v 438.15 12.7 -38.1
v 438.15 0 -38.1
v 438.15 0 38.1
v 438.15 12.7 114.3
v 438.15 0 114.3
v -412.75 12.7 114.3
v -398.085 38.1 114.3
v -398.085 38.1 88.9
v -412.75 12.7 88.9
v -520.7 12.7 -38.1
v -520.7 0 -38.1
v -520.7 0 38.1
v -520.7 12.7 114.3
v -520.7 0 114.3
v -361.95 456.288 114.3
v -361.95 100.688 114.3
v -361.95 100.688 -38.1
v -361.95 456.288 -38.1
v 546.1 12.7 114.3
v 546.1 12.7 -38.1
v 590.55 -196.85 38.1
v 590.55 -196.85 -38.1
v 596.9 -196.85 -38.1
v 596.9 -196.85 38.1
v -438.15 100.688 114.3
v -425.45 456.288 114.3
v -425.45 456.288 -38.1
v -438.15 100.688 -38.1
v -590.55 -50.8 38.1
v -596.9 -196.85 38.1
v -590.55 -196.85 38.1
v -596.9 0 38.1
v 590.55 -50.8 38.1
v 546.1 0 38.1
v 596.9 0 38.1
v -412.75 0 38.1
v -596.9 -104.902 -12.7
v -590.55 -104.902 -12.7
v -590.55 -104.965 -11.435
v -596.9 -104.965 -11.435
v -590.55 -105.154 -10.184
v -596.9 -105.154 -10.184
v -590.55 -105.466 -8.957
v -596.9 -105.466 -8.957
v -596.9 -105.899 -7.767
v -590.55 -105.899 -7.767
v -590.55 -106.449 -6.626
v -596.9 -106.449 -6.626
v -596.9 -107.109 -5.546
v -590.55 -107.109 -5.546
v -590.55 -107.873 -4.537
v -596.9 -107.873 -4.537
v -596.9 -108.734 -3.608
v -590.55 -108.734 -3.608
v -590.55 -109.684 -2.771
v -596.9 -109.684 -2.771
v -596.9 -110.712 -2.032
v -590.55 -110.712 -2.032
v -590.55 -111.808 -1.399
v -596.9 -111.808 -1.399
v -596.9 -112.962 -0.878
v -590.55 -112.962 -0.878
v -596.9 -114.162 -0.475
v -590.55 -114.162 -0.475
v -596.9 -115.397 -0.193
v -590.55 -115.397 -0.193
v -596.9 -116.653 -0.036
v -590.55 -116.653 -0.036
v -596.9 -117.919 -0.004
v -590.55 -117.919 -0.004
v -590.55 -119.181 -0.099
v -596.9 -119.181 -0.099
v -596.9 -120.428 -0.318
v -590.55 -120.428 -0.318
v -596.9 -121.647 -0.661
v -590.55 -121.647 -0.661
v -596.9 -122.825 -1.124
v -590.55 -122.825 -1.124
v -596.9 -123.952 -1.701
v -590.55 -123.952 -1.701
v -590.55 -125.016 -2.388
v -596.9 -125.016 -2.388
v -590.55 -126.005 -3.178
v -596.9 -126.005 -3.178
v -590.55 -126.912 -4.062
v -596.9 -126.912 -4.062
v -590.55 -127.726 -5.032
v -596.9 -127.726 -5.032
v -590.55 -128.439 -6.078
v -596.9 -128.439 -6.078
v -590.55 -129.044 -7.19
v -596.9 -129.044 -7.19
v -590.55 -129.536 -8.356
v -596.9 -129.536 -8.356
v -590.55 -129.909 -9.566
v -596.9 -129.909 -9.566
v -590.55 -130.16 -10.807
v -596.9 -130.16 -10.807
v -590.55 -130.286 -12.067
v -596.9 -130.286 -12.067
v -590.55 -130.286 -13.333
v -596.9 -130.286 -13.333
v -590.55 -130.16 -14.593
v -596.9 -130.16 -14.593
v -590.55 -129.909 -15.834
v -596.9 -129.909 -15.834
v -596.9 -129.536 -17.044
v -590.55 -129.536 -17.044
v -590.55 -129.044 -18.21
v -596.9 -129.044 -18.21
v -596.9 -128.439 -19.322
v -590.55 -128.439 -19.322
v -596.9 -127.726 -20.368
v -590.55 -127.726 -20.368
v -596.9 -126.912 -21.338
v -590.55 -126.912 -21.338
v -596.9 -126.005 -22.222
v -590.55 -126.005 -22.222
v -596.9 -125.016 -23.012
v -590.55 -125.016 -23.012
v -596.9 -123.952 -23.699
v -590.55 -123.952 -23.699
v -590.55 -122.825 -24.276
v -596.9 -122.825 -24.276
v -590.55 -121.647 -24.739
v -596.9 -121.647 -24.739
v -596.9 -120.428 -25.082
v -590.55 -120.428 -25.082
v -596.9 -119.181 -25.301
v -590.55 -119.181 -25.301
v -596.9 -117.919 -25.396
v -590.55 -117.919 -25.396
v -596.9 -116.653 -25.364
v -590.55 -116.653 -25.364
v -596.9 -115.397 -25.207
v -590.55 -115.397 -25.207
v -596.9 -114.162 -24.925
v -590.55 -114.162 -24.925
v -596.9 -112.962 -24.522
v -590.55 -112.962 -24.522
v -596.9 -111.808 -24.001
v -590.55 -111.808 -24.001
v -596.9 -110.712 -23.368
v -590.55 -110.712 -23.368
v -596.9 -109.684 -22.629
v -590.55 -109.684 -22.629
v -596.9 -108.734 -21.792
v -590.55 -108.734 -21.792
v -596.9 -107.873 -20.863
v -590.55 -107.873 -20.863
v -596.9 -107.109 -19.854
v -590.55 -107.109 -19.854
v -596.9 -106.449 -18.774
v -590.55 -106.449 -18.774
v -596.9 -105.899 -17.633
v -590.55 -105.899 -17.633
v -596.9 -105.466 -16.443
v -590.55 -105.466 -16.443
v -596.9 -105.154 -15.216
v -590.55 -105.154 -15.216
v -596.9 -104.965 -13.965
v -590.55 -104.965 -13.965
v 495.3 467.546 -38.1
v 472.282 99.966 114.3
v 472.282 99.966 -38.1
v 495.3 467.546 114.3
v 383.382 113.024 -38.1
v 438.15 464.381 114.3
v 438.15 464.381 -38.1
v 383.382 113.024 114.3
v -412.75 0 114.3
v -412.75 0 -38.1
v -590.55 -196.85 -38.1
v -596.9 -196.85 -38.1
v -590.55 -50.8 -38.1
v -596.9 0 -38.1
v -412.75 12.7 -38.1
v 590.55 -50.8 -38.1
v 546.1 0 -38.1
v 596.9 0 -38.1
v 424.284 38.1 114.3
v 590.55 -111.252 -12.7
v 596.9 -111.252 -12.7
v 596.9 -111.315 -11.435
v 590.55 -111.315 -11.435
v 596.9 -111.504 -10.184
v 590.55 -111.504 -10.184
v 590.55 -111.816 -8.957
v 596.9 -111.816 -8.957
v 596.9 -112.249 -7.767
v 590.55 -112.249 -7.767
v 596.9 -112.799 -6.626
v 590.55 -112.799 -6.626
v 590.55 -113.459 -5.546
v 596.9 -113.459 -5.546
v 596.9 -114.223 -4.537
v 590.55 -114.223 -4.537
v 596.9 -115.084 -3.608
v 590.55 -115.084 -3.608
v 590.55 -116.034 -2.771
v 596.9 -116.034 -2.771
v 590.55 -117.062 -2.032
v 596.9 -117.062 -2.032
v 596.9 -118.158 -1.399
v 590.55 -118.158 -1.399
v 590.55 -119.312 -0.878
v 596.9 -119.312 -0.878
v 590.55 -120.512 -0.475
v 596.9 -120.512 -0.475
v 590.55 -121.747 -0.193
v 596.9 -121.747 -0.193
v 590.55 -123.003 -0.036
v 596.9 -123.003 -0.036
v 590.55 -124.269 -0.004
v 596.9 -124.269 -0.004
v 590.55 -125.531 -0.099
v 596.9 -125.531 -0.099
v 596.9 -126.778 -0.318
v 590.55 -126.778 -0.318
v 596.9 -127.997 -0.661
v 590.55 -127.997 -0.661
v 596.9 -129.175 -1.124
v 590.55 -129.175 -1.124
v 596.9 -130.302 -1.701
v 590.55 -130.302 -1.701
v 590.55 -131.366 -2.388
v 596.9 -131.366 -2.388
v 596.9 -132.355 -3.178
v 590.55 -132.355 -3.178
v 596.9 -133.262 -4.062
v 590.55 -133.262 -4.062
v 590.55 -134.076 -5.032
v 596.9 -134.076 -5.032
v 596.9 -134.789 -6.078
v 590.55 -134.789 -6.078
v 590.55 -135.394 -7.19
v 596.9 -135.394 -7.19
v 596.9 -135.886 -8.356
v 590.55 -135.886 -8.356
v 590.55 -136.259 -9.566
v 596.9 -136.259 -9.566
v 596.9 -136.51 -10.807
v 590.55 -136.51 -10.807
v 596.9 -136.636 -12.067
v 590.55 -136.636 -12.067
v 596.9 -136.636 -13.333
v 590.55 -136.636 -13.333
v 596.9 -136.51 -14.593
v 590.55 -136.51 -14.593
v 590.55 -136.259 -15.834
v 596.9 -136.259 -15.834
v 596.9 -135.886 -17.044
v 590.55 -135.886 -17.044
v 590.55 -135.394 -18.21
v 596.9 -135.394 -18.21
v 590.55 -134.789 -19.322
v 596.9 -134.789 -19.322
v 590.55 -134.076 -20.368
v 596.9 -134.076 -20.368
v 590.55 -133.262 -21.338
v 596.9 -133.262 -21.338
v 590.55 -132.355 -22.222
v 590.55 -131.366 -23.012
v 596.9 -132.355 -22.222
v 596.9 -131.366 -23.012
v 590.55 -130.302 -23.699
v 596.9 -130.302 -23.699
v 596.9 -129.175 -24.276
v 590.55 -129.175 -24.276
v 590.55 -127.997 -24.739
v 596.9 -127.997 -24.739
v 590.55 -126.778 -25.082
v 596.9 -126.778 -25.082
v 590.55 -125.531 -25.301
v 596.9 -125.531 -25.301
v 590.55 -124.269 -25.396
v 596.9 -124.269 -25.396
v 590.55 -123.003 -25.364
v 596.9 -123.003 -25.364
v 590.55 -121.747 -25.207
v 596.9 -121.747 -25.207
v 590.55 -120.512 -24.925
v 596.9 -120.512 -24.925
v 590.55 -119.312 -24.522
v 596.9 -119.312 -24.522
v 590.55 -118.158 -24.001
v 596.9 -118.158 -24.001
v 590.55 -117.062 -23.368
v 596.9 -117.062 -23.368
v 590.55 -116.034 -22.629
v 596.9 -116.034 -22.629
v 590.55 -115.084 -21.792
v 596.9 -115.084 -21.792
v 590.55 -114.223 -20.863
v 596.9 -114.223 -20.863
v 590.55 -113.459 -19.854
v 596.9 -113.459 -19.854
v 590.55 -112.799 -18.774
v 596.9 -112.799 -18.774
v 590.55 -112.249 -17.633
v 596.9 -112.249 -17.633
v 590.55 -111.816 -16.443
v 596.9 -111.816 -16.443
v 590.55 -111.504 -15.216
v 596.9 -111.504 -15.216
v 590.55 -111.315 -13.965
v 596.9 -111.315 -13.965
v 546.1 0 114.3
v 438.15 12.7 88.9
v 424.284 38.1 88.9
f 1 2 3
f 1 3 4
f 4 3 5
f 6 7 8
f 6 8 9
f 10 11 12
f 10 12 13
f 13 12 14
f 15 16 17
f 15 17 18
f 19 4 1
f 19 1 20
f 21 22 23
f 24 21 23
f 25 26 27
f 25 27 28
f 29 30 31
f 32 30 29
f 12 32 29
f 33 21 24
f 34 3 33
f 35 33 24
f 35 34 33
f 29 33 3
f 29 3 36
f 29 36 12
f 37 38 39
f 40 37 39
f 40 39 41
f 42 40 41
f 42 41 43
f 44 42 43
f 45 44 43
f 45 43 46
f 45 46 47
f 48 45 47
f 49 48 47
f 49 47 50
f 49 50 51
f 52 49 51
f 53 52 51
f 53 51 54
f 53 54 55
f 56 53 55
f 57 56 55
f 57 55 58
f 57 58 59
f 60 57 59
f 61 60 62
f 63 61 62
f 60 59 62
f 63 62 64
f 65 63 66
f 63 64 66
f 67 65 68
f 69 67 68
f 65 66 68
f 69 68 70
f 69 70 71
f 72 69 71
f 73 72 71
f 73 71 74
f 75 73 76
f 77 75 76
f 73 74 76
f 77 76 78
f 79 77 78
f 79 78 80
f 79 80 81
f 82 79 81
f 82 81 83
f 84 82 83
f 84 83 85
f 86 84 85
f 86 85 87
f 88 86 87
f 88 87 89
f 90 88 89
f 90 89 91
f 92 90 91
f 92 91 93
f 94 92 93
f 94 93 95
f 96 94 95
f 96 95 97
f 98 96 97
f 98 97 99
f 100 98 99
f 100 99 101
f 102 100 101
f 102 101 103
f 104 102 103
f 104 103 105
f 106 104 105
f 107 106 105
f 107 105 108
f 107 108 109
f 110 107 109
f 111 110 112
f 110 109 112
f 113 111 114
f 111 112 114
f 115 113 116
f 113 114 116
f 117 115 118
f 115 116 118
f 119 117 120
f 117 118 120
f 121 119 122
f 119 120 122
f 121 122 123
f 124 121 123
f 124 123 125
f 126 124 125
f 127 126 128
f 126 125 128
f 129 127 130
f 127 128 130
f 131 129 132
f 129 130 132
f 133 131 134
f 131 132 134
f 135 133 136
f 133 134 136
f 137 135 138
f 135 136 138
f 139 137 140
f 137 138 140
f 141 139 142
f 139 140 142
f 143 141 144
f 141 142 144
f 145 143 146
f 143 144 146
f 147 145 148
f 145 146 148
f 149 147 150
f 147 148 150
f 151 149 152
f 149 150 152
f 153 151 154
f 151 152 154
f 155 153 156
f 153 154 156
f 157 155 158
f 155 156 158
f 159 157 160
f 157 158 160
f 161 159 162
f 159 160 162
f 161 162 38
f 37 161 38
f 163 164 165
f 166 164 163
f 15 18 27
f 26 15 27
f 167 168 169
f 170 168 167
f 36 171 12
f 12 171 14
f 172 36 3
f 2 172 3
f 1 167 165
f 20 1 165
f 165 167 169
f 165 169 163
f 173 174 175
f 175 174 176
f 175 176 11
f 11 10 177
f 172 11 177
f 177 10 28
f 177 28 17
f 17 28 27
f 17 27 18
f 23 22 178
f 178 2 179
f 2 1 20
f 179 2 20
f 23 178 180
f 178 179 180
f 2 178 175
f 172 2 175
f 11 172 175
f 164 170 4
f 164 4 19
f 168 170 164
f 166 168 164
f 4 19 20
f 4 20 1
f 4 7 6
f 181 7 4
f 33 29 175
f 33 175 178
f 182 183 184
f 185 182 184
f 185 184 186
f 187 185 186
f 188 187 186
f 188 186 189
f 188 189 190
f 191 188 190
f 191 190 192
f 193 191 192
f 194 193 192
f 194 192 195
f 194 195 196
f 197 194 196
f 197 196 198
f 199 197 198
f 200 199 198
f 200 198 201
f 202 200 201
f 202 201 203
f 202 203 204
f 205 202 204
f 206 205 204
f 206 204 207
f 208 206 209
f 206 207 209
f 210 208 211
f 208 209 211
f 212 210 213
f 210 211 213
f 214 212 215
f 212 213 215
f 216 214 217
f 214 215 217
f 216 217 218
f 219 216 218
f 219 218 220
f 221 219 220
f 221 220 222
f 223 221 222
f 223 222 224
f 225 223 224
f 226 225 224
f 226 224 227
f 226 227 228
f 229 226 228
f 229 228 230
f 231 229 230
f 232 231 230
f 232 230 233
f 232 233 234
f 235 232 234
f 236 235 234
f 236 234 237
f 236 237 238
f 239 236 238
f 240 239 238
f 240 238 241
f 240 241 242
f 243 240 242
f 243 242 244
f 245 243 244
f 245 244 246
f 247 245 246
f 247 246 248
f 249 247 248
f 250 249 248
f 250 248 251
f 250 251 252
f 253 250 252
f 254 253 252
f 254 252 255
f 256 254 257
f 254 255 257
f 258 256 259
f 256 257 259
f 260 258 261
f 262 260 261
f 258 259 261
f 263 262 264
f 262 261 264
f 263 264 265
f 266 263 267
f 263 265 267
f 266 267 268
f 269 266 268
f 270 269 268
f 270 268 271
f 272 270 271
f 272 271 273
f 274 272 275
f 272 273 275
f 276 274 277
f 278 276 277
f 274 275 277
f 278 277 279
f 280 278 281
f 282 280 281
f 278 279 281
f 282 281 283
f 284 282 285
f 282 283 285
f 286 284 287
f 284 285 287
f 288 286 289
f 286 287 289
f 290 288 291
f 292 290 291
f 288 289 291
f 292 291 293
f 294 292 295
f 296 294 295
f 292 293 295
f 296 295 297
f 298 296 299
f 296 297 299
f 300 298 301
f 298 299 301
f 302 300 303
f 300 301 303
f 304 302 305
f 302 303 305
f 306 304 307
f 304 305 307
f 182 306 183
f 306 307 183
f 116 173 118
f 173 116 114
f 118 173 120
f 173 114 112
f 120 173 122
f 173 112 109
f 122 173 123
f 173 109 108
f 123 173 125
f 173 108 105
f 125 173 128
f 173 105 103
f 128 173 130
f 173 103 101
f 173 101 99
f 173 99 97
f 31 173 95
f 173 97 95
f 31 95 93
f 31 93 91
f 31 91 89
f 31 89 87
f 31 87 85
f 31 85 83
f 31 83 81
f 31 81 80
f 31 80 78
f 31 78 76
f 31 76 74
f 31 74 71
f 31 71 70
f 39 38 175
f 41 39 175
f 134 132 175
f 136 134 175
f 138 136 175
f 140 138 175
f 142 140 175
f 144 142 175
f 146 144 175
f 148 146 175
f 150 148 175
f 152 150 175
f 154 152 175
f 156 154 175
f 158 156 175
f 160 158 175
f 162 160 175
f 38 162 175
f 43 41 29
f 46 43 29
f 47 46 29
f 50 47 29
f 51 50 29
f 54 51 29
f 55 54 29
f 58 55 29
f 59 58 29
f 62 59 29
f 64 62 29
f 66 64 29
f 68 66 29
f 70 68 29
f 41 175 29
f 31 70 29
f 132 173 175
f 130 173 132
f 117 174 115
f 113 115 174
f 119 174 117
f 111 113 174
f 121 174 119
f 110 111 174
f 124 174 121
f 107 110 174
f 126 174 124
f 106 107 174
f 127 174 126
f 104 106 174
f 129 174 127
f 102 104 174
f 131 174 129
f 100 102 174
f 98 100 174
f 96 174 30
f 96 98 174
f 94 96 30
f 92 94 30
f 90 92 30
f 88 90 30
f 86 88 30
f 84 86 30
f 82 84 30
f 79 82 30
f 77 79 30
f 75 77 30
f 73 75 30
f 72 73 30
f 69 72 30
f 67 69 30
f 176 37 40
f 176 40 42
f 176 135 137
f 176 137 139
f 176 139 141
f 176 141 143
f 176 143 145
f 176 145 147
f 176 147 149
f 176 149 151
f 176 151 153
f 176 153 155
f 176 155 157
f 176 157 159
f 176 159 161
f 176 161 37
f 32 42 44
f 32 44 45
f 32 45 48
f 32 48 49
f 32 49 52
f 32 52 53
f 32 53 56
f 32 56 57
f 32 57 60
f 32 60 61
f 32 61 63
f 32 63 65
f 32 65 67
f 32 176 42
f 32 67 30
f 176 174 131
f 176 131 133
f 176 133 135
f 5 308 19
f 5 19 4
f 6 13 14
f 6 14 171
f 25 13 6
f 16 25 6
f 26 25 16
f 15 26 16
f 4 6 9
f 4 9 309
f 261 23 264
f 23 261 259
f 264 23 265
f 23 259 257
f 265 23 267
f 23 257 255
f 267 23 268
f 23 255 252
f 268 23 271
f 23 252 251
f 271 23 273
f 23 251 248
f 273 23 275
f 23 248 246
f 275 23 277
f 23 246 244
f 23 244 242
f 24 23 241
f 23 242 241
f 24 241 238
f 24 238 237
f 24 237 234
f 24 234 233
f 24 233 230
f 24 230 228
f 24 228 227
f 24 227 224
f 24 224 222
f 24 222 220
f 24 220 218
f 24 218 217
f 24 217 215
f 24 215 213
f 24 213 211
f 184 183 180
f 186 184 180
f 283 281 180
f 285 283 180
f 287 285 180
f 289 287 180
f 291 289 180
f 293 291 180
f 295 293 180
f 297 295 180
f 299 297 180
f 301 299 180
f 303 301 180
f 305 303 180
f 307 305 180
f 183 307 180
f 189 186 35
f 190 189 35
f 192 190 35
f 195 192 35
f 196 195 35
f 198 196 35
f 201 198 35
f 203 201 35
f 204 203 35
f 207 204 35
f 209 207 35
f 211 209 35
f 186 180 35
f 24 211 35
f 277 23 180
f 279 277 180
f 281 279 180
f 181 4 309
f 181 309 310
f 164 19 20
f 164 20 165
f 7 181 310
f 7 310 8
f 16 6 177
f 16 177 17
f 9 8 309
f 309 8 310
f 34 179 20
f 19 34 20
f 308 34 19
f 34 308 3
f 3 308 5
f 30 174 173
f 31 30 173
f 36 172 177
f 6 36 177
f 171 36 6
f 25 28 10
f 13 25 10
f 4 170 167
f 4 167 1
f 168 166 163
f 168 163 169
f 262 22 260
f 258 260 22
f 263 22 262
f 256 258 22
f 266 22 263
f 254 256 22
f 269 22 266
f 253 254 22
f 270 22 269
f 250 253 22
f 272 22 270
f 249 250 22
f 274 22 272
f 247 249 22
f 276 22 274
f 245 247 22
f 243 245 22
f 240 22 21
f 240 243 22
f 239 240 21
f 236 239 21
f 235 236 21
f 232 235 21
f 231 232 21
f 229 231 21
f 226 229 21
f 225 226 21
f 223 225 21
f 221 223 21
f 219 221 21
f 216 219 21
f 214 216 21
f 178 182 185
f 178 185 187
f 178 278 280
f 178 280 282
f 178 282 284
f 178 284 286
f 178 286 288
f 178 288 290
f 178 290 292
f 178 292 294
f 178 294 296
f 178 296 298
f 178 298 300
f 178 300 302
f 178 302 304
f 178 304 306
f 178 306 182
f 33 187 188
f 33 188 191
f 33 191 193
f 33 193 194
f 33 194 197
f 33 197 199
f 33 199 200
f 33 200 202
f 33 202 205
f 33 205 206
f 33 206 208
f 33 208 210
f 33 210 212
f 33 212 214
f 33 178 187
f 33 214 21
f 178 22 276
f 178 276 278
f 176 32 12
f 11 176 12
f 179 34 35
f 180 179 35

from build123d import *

# Parameters (mm, degrees)
F1_DEPTH  = 50.8
F2_W      = 6.35
F2_H      = 76.2
F3_DEPTH  = 146.05
F4_R      = 12.7
F5_DEPTH  = 25.4
F6_R      = 12.7
F7_DEPTH  = 25.4
F8_W      = 107.95
F8_H      = 152.4
F9_DEPTH  = 12.7
F12_DEPTH = 152.4
F14_DEPTH = 25.4
F15_DEPTH = 152.4


# Not quite as in the source:
# - a feature names something its author has since deleted; it is built from what else it names


with BuildPart() as f1:
    # F0 (on Front) → F1 (new body)
    with BuildSketch(Plane.XZ):
        Polygon((-590.55, 38.1), (-596.9, 38.1), (-596.9, -38.1), (-590.55, -38.1), (590.55, -38.1), (596.9, -38.1), (596.9, 38.1), (590.55, 38.1), align=None)
    extrude(amount=F1_DEPTH)

    # F2 (on face) → F3 (join)
    with BuildSketch(Plane.XZ.offset(50.8)):
        with Locations((-593.725, 0)):
            Rectangle(F2_W, F2_H)
        with Locations((593.725, 0)):
            Rectangle(F2_W, F2_H)
    extrude(amount=F3_DEPTH)

    # F4 (on face) → F5 (cut)
    with BuildSketch(Plane.YZ.offset(-590.55)):
        with Locations((-117.602, -12.7)):
            Circle(F4_R)
    extrude(amount=-F5_DEPTH, mode=Mode.SUBTRACT)

    # F6 (on face) → F7 (cut)
    with BuildSketch(Plane.YZ.offset(596.9)):
        with Locations((-123.952, -12.7)):
            Circle(F6_R)
    extrude(amount=-F7_DEPTH, mode=Mode.SUBTRACT)

    # F8 (on face) → F9 (join)
    with BuildSketch(Plane(origin=(0, 0, 0), x_dir=(-1, 0, 0), z_dir=(0, 1, 0))):
        with Locations((-492.125, 38.1)):
            Rectangle(F8_W, F8_H)
        with Locations((466.725, 38.1)):
            Rectangle(F8_W, F8_H)
    extrude(amount=F9_DEPTH)

    # F11 (on face) → F12 (join)
    with BuildSketch(Plane.XY.offset(114.3)):
        Polygon((-520.7, 12.7), (-412.75, 12.7), (-361.95, 100.6881810245), (-361.95, 456.2881810245), (-425.45, 456.2881810245), (-438.15, 100.6881810245), align=None)
    extrude(amount=-F12_DEPTH)


with BuildPart() as f14:
    # F13 (on face) → F14 (new body)
    with BuildSketch(Plane.XY.offset(114.3)):
        Polygon((-398.0853031626, 38.1), (-412.75, 12.7), (438.15, 12.7), (424.2838223851, 38.1), align=None)
    extrude(amount=-F14_DEPTH)


with BuildPart() as f15:
    # F10 (on face) → F15 (new body)
    with BuildSketch(Plane.XY.offset(114.3)):
        Polygon((383.38179553, 113.0241435505), (438.15, 12.7), (546.1, 12.7), (472.28179553, 99.966045452), (495.3, 467.5460398246), (438.15, 464.3812322496), align=None)
    extrude(amount=-F15_DEPTH)


solid = Compound([f1.part, f14.part, f15.part])
